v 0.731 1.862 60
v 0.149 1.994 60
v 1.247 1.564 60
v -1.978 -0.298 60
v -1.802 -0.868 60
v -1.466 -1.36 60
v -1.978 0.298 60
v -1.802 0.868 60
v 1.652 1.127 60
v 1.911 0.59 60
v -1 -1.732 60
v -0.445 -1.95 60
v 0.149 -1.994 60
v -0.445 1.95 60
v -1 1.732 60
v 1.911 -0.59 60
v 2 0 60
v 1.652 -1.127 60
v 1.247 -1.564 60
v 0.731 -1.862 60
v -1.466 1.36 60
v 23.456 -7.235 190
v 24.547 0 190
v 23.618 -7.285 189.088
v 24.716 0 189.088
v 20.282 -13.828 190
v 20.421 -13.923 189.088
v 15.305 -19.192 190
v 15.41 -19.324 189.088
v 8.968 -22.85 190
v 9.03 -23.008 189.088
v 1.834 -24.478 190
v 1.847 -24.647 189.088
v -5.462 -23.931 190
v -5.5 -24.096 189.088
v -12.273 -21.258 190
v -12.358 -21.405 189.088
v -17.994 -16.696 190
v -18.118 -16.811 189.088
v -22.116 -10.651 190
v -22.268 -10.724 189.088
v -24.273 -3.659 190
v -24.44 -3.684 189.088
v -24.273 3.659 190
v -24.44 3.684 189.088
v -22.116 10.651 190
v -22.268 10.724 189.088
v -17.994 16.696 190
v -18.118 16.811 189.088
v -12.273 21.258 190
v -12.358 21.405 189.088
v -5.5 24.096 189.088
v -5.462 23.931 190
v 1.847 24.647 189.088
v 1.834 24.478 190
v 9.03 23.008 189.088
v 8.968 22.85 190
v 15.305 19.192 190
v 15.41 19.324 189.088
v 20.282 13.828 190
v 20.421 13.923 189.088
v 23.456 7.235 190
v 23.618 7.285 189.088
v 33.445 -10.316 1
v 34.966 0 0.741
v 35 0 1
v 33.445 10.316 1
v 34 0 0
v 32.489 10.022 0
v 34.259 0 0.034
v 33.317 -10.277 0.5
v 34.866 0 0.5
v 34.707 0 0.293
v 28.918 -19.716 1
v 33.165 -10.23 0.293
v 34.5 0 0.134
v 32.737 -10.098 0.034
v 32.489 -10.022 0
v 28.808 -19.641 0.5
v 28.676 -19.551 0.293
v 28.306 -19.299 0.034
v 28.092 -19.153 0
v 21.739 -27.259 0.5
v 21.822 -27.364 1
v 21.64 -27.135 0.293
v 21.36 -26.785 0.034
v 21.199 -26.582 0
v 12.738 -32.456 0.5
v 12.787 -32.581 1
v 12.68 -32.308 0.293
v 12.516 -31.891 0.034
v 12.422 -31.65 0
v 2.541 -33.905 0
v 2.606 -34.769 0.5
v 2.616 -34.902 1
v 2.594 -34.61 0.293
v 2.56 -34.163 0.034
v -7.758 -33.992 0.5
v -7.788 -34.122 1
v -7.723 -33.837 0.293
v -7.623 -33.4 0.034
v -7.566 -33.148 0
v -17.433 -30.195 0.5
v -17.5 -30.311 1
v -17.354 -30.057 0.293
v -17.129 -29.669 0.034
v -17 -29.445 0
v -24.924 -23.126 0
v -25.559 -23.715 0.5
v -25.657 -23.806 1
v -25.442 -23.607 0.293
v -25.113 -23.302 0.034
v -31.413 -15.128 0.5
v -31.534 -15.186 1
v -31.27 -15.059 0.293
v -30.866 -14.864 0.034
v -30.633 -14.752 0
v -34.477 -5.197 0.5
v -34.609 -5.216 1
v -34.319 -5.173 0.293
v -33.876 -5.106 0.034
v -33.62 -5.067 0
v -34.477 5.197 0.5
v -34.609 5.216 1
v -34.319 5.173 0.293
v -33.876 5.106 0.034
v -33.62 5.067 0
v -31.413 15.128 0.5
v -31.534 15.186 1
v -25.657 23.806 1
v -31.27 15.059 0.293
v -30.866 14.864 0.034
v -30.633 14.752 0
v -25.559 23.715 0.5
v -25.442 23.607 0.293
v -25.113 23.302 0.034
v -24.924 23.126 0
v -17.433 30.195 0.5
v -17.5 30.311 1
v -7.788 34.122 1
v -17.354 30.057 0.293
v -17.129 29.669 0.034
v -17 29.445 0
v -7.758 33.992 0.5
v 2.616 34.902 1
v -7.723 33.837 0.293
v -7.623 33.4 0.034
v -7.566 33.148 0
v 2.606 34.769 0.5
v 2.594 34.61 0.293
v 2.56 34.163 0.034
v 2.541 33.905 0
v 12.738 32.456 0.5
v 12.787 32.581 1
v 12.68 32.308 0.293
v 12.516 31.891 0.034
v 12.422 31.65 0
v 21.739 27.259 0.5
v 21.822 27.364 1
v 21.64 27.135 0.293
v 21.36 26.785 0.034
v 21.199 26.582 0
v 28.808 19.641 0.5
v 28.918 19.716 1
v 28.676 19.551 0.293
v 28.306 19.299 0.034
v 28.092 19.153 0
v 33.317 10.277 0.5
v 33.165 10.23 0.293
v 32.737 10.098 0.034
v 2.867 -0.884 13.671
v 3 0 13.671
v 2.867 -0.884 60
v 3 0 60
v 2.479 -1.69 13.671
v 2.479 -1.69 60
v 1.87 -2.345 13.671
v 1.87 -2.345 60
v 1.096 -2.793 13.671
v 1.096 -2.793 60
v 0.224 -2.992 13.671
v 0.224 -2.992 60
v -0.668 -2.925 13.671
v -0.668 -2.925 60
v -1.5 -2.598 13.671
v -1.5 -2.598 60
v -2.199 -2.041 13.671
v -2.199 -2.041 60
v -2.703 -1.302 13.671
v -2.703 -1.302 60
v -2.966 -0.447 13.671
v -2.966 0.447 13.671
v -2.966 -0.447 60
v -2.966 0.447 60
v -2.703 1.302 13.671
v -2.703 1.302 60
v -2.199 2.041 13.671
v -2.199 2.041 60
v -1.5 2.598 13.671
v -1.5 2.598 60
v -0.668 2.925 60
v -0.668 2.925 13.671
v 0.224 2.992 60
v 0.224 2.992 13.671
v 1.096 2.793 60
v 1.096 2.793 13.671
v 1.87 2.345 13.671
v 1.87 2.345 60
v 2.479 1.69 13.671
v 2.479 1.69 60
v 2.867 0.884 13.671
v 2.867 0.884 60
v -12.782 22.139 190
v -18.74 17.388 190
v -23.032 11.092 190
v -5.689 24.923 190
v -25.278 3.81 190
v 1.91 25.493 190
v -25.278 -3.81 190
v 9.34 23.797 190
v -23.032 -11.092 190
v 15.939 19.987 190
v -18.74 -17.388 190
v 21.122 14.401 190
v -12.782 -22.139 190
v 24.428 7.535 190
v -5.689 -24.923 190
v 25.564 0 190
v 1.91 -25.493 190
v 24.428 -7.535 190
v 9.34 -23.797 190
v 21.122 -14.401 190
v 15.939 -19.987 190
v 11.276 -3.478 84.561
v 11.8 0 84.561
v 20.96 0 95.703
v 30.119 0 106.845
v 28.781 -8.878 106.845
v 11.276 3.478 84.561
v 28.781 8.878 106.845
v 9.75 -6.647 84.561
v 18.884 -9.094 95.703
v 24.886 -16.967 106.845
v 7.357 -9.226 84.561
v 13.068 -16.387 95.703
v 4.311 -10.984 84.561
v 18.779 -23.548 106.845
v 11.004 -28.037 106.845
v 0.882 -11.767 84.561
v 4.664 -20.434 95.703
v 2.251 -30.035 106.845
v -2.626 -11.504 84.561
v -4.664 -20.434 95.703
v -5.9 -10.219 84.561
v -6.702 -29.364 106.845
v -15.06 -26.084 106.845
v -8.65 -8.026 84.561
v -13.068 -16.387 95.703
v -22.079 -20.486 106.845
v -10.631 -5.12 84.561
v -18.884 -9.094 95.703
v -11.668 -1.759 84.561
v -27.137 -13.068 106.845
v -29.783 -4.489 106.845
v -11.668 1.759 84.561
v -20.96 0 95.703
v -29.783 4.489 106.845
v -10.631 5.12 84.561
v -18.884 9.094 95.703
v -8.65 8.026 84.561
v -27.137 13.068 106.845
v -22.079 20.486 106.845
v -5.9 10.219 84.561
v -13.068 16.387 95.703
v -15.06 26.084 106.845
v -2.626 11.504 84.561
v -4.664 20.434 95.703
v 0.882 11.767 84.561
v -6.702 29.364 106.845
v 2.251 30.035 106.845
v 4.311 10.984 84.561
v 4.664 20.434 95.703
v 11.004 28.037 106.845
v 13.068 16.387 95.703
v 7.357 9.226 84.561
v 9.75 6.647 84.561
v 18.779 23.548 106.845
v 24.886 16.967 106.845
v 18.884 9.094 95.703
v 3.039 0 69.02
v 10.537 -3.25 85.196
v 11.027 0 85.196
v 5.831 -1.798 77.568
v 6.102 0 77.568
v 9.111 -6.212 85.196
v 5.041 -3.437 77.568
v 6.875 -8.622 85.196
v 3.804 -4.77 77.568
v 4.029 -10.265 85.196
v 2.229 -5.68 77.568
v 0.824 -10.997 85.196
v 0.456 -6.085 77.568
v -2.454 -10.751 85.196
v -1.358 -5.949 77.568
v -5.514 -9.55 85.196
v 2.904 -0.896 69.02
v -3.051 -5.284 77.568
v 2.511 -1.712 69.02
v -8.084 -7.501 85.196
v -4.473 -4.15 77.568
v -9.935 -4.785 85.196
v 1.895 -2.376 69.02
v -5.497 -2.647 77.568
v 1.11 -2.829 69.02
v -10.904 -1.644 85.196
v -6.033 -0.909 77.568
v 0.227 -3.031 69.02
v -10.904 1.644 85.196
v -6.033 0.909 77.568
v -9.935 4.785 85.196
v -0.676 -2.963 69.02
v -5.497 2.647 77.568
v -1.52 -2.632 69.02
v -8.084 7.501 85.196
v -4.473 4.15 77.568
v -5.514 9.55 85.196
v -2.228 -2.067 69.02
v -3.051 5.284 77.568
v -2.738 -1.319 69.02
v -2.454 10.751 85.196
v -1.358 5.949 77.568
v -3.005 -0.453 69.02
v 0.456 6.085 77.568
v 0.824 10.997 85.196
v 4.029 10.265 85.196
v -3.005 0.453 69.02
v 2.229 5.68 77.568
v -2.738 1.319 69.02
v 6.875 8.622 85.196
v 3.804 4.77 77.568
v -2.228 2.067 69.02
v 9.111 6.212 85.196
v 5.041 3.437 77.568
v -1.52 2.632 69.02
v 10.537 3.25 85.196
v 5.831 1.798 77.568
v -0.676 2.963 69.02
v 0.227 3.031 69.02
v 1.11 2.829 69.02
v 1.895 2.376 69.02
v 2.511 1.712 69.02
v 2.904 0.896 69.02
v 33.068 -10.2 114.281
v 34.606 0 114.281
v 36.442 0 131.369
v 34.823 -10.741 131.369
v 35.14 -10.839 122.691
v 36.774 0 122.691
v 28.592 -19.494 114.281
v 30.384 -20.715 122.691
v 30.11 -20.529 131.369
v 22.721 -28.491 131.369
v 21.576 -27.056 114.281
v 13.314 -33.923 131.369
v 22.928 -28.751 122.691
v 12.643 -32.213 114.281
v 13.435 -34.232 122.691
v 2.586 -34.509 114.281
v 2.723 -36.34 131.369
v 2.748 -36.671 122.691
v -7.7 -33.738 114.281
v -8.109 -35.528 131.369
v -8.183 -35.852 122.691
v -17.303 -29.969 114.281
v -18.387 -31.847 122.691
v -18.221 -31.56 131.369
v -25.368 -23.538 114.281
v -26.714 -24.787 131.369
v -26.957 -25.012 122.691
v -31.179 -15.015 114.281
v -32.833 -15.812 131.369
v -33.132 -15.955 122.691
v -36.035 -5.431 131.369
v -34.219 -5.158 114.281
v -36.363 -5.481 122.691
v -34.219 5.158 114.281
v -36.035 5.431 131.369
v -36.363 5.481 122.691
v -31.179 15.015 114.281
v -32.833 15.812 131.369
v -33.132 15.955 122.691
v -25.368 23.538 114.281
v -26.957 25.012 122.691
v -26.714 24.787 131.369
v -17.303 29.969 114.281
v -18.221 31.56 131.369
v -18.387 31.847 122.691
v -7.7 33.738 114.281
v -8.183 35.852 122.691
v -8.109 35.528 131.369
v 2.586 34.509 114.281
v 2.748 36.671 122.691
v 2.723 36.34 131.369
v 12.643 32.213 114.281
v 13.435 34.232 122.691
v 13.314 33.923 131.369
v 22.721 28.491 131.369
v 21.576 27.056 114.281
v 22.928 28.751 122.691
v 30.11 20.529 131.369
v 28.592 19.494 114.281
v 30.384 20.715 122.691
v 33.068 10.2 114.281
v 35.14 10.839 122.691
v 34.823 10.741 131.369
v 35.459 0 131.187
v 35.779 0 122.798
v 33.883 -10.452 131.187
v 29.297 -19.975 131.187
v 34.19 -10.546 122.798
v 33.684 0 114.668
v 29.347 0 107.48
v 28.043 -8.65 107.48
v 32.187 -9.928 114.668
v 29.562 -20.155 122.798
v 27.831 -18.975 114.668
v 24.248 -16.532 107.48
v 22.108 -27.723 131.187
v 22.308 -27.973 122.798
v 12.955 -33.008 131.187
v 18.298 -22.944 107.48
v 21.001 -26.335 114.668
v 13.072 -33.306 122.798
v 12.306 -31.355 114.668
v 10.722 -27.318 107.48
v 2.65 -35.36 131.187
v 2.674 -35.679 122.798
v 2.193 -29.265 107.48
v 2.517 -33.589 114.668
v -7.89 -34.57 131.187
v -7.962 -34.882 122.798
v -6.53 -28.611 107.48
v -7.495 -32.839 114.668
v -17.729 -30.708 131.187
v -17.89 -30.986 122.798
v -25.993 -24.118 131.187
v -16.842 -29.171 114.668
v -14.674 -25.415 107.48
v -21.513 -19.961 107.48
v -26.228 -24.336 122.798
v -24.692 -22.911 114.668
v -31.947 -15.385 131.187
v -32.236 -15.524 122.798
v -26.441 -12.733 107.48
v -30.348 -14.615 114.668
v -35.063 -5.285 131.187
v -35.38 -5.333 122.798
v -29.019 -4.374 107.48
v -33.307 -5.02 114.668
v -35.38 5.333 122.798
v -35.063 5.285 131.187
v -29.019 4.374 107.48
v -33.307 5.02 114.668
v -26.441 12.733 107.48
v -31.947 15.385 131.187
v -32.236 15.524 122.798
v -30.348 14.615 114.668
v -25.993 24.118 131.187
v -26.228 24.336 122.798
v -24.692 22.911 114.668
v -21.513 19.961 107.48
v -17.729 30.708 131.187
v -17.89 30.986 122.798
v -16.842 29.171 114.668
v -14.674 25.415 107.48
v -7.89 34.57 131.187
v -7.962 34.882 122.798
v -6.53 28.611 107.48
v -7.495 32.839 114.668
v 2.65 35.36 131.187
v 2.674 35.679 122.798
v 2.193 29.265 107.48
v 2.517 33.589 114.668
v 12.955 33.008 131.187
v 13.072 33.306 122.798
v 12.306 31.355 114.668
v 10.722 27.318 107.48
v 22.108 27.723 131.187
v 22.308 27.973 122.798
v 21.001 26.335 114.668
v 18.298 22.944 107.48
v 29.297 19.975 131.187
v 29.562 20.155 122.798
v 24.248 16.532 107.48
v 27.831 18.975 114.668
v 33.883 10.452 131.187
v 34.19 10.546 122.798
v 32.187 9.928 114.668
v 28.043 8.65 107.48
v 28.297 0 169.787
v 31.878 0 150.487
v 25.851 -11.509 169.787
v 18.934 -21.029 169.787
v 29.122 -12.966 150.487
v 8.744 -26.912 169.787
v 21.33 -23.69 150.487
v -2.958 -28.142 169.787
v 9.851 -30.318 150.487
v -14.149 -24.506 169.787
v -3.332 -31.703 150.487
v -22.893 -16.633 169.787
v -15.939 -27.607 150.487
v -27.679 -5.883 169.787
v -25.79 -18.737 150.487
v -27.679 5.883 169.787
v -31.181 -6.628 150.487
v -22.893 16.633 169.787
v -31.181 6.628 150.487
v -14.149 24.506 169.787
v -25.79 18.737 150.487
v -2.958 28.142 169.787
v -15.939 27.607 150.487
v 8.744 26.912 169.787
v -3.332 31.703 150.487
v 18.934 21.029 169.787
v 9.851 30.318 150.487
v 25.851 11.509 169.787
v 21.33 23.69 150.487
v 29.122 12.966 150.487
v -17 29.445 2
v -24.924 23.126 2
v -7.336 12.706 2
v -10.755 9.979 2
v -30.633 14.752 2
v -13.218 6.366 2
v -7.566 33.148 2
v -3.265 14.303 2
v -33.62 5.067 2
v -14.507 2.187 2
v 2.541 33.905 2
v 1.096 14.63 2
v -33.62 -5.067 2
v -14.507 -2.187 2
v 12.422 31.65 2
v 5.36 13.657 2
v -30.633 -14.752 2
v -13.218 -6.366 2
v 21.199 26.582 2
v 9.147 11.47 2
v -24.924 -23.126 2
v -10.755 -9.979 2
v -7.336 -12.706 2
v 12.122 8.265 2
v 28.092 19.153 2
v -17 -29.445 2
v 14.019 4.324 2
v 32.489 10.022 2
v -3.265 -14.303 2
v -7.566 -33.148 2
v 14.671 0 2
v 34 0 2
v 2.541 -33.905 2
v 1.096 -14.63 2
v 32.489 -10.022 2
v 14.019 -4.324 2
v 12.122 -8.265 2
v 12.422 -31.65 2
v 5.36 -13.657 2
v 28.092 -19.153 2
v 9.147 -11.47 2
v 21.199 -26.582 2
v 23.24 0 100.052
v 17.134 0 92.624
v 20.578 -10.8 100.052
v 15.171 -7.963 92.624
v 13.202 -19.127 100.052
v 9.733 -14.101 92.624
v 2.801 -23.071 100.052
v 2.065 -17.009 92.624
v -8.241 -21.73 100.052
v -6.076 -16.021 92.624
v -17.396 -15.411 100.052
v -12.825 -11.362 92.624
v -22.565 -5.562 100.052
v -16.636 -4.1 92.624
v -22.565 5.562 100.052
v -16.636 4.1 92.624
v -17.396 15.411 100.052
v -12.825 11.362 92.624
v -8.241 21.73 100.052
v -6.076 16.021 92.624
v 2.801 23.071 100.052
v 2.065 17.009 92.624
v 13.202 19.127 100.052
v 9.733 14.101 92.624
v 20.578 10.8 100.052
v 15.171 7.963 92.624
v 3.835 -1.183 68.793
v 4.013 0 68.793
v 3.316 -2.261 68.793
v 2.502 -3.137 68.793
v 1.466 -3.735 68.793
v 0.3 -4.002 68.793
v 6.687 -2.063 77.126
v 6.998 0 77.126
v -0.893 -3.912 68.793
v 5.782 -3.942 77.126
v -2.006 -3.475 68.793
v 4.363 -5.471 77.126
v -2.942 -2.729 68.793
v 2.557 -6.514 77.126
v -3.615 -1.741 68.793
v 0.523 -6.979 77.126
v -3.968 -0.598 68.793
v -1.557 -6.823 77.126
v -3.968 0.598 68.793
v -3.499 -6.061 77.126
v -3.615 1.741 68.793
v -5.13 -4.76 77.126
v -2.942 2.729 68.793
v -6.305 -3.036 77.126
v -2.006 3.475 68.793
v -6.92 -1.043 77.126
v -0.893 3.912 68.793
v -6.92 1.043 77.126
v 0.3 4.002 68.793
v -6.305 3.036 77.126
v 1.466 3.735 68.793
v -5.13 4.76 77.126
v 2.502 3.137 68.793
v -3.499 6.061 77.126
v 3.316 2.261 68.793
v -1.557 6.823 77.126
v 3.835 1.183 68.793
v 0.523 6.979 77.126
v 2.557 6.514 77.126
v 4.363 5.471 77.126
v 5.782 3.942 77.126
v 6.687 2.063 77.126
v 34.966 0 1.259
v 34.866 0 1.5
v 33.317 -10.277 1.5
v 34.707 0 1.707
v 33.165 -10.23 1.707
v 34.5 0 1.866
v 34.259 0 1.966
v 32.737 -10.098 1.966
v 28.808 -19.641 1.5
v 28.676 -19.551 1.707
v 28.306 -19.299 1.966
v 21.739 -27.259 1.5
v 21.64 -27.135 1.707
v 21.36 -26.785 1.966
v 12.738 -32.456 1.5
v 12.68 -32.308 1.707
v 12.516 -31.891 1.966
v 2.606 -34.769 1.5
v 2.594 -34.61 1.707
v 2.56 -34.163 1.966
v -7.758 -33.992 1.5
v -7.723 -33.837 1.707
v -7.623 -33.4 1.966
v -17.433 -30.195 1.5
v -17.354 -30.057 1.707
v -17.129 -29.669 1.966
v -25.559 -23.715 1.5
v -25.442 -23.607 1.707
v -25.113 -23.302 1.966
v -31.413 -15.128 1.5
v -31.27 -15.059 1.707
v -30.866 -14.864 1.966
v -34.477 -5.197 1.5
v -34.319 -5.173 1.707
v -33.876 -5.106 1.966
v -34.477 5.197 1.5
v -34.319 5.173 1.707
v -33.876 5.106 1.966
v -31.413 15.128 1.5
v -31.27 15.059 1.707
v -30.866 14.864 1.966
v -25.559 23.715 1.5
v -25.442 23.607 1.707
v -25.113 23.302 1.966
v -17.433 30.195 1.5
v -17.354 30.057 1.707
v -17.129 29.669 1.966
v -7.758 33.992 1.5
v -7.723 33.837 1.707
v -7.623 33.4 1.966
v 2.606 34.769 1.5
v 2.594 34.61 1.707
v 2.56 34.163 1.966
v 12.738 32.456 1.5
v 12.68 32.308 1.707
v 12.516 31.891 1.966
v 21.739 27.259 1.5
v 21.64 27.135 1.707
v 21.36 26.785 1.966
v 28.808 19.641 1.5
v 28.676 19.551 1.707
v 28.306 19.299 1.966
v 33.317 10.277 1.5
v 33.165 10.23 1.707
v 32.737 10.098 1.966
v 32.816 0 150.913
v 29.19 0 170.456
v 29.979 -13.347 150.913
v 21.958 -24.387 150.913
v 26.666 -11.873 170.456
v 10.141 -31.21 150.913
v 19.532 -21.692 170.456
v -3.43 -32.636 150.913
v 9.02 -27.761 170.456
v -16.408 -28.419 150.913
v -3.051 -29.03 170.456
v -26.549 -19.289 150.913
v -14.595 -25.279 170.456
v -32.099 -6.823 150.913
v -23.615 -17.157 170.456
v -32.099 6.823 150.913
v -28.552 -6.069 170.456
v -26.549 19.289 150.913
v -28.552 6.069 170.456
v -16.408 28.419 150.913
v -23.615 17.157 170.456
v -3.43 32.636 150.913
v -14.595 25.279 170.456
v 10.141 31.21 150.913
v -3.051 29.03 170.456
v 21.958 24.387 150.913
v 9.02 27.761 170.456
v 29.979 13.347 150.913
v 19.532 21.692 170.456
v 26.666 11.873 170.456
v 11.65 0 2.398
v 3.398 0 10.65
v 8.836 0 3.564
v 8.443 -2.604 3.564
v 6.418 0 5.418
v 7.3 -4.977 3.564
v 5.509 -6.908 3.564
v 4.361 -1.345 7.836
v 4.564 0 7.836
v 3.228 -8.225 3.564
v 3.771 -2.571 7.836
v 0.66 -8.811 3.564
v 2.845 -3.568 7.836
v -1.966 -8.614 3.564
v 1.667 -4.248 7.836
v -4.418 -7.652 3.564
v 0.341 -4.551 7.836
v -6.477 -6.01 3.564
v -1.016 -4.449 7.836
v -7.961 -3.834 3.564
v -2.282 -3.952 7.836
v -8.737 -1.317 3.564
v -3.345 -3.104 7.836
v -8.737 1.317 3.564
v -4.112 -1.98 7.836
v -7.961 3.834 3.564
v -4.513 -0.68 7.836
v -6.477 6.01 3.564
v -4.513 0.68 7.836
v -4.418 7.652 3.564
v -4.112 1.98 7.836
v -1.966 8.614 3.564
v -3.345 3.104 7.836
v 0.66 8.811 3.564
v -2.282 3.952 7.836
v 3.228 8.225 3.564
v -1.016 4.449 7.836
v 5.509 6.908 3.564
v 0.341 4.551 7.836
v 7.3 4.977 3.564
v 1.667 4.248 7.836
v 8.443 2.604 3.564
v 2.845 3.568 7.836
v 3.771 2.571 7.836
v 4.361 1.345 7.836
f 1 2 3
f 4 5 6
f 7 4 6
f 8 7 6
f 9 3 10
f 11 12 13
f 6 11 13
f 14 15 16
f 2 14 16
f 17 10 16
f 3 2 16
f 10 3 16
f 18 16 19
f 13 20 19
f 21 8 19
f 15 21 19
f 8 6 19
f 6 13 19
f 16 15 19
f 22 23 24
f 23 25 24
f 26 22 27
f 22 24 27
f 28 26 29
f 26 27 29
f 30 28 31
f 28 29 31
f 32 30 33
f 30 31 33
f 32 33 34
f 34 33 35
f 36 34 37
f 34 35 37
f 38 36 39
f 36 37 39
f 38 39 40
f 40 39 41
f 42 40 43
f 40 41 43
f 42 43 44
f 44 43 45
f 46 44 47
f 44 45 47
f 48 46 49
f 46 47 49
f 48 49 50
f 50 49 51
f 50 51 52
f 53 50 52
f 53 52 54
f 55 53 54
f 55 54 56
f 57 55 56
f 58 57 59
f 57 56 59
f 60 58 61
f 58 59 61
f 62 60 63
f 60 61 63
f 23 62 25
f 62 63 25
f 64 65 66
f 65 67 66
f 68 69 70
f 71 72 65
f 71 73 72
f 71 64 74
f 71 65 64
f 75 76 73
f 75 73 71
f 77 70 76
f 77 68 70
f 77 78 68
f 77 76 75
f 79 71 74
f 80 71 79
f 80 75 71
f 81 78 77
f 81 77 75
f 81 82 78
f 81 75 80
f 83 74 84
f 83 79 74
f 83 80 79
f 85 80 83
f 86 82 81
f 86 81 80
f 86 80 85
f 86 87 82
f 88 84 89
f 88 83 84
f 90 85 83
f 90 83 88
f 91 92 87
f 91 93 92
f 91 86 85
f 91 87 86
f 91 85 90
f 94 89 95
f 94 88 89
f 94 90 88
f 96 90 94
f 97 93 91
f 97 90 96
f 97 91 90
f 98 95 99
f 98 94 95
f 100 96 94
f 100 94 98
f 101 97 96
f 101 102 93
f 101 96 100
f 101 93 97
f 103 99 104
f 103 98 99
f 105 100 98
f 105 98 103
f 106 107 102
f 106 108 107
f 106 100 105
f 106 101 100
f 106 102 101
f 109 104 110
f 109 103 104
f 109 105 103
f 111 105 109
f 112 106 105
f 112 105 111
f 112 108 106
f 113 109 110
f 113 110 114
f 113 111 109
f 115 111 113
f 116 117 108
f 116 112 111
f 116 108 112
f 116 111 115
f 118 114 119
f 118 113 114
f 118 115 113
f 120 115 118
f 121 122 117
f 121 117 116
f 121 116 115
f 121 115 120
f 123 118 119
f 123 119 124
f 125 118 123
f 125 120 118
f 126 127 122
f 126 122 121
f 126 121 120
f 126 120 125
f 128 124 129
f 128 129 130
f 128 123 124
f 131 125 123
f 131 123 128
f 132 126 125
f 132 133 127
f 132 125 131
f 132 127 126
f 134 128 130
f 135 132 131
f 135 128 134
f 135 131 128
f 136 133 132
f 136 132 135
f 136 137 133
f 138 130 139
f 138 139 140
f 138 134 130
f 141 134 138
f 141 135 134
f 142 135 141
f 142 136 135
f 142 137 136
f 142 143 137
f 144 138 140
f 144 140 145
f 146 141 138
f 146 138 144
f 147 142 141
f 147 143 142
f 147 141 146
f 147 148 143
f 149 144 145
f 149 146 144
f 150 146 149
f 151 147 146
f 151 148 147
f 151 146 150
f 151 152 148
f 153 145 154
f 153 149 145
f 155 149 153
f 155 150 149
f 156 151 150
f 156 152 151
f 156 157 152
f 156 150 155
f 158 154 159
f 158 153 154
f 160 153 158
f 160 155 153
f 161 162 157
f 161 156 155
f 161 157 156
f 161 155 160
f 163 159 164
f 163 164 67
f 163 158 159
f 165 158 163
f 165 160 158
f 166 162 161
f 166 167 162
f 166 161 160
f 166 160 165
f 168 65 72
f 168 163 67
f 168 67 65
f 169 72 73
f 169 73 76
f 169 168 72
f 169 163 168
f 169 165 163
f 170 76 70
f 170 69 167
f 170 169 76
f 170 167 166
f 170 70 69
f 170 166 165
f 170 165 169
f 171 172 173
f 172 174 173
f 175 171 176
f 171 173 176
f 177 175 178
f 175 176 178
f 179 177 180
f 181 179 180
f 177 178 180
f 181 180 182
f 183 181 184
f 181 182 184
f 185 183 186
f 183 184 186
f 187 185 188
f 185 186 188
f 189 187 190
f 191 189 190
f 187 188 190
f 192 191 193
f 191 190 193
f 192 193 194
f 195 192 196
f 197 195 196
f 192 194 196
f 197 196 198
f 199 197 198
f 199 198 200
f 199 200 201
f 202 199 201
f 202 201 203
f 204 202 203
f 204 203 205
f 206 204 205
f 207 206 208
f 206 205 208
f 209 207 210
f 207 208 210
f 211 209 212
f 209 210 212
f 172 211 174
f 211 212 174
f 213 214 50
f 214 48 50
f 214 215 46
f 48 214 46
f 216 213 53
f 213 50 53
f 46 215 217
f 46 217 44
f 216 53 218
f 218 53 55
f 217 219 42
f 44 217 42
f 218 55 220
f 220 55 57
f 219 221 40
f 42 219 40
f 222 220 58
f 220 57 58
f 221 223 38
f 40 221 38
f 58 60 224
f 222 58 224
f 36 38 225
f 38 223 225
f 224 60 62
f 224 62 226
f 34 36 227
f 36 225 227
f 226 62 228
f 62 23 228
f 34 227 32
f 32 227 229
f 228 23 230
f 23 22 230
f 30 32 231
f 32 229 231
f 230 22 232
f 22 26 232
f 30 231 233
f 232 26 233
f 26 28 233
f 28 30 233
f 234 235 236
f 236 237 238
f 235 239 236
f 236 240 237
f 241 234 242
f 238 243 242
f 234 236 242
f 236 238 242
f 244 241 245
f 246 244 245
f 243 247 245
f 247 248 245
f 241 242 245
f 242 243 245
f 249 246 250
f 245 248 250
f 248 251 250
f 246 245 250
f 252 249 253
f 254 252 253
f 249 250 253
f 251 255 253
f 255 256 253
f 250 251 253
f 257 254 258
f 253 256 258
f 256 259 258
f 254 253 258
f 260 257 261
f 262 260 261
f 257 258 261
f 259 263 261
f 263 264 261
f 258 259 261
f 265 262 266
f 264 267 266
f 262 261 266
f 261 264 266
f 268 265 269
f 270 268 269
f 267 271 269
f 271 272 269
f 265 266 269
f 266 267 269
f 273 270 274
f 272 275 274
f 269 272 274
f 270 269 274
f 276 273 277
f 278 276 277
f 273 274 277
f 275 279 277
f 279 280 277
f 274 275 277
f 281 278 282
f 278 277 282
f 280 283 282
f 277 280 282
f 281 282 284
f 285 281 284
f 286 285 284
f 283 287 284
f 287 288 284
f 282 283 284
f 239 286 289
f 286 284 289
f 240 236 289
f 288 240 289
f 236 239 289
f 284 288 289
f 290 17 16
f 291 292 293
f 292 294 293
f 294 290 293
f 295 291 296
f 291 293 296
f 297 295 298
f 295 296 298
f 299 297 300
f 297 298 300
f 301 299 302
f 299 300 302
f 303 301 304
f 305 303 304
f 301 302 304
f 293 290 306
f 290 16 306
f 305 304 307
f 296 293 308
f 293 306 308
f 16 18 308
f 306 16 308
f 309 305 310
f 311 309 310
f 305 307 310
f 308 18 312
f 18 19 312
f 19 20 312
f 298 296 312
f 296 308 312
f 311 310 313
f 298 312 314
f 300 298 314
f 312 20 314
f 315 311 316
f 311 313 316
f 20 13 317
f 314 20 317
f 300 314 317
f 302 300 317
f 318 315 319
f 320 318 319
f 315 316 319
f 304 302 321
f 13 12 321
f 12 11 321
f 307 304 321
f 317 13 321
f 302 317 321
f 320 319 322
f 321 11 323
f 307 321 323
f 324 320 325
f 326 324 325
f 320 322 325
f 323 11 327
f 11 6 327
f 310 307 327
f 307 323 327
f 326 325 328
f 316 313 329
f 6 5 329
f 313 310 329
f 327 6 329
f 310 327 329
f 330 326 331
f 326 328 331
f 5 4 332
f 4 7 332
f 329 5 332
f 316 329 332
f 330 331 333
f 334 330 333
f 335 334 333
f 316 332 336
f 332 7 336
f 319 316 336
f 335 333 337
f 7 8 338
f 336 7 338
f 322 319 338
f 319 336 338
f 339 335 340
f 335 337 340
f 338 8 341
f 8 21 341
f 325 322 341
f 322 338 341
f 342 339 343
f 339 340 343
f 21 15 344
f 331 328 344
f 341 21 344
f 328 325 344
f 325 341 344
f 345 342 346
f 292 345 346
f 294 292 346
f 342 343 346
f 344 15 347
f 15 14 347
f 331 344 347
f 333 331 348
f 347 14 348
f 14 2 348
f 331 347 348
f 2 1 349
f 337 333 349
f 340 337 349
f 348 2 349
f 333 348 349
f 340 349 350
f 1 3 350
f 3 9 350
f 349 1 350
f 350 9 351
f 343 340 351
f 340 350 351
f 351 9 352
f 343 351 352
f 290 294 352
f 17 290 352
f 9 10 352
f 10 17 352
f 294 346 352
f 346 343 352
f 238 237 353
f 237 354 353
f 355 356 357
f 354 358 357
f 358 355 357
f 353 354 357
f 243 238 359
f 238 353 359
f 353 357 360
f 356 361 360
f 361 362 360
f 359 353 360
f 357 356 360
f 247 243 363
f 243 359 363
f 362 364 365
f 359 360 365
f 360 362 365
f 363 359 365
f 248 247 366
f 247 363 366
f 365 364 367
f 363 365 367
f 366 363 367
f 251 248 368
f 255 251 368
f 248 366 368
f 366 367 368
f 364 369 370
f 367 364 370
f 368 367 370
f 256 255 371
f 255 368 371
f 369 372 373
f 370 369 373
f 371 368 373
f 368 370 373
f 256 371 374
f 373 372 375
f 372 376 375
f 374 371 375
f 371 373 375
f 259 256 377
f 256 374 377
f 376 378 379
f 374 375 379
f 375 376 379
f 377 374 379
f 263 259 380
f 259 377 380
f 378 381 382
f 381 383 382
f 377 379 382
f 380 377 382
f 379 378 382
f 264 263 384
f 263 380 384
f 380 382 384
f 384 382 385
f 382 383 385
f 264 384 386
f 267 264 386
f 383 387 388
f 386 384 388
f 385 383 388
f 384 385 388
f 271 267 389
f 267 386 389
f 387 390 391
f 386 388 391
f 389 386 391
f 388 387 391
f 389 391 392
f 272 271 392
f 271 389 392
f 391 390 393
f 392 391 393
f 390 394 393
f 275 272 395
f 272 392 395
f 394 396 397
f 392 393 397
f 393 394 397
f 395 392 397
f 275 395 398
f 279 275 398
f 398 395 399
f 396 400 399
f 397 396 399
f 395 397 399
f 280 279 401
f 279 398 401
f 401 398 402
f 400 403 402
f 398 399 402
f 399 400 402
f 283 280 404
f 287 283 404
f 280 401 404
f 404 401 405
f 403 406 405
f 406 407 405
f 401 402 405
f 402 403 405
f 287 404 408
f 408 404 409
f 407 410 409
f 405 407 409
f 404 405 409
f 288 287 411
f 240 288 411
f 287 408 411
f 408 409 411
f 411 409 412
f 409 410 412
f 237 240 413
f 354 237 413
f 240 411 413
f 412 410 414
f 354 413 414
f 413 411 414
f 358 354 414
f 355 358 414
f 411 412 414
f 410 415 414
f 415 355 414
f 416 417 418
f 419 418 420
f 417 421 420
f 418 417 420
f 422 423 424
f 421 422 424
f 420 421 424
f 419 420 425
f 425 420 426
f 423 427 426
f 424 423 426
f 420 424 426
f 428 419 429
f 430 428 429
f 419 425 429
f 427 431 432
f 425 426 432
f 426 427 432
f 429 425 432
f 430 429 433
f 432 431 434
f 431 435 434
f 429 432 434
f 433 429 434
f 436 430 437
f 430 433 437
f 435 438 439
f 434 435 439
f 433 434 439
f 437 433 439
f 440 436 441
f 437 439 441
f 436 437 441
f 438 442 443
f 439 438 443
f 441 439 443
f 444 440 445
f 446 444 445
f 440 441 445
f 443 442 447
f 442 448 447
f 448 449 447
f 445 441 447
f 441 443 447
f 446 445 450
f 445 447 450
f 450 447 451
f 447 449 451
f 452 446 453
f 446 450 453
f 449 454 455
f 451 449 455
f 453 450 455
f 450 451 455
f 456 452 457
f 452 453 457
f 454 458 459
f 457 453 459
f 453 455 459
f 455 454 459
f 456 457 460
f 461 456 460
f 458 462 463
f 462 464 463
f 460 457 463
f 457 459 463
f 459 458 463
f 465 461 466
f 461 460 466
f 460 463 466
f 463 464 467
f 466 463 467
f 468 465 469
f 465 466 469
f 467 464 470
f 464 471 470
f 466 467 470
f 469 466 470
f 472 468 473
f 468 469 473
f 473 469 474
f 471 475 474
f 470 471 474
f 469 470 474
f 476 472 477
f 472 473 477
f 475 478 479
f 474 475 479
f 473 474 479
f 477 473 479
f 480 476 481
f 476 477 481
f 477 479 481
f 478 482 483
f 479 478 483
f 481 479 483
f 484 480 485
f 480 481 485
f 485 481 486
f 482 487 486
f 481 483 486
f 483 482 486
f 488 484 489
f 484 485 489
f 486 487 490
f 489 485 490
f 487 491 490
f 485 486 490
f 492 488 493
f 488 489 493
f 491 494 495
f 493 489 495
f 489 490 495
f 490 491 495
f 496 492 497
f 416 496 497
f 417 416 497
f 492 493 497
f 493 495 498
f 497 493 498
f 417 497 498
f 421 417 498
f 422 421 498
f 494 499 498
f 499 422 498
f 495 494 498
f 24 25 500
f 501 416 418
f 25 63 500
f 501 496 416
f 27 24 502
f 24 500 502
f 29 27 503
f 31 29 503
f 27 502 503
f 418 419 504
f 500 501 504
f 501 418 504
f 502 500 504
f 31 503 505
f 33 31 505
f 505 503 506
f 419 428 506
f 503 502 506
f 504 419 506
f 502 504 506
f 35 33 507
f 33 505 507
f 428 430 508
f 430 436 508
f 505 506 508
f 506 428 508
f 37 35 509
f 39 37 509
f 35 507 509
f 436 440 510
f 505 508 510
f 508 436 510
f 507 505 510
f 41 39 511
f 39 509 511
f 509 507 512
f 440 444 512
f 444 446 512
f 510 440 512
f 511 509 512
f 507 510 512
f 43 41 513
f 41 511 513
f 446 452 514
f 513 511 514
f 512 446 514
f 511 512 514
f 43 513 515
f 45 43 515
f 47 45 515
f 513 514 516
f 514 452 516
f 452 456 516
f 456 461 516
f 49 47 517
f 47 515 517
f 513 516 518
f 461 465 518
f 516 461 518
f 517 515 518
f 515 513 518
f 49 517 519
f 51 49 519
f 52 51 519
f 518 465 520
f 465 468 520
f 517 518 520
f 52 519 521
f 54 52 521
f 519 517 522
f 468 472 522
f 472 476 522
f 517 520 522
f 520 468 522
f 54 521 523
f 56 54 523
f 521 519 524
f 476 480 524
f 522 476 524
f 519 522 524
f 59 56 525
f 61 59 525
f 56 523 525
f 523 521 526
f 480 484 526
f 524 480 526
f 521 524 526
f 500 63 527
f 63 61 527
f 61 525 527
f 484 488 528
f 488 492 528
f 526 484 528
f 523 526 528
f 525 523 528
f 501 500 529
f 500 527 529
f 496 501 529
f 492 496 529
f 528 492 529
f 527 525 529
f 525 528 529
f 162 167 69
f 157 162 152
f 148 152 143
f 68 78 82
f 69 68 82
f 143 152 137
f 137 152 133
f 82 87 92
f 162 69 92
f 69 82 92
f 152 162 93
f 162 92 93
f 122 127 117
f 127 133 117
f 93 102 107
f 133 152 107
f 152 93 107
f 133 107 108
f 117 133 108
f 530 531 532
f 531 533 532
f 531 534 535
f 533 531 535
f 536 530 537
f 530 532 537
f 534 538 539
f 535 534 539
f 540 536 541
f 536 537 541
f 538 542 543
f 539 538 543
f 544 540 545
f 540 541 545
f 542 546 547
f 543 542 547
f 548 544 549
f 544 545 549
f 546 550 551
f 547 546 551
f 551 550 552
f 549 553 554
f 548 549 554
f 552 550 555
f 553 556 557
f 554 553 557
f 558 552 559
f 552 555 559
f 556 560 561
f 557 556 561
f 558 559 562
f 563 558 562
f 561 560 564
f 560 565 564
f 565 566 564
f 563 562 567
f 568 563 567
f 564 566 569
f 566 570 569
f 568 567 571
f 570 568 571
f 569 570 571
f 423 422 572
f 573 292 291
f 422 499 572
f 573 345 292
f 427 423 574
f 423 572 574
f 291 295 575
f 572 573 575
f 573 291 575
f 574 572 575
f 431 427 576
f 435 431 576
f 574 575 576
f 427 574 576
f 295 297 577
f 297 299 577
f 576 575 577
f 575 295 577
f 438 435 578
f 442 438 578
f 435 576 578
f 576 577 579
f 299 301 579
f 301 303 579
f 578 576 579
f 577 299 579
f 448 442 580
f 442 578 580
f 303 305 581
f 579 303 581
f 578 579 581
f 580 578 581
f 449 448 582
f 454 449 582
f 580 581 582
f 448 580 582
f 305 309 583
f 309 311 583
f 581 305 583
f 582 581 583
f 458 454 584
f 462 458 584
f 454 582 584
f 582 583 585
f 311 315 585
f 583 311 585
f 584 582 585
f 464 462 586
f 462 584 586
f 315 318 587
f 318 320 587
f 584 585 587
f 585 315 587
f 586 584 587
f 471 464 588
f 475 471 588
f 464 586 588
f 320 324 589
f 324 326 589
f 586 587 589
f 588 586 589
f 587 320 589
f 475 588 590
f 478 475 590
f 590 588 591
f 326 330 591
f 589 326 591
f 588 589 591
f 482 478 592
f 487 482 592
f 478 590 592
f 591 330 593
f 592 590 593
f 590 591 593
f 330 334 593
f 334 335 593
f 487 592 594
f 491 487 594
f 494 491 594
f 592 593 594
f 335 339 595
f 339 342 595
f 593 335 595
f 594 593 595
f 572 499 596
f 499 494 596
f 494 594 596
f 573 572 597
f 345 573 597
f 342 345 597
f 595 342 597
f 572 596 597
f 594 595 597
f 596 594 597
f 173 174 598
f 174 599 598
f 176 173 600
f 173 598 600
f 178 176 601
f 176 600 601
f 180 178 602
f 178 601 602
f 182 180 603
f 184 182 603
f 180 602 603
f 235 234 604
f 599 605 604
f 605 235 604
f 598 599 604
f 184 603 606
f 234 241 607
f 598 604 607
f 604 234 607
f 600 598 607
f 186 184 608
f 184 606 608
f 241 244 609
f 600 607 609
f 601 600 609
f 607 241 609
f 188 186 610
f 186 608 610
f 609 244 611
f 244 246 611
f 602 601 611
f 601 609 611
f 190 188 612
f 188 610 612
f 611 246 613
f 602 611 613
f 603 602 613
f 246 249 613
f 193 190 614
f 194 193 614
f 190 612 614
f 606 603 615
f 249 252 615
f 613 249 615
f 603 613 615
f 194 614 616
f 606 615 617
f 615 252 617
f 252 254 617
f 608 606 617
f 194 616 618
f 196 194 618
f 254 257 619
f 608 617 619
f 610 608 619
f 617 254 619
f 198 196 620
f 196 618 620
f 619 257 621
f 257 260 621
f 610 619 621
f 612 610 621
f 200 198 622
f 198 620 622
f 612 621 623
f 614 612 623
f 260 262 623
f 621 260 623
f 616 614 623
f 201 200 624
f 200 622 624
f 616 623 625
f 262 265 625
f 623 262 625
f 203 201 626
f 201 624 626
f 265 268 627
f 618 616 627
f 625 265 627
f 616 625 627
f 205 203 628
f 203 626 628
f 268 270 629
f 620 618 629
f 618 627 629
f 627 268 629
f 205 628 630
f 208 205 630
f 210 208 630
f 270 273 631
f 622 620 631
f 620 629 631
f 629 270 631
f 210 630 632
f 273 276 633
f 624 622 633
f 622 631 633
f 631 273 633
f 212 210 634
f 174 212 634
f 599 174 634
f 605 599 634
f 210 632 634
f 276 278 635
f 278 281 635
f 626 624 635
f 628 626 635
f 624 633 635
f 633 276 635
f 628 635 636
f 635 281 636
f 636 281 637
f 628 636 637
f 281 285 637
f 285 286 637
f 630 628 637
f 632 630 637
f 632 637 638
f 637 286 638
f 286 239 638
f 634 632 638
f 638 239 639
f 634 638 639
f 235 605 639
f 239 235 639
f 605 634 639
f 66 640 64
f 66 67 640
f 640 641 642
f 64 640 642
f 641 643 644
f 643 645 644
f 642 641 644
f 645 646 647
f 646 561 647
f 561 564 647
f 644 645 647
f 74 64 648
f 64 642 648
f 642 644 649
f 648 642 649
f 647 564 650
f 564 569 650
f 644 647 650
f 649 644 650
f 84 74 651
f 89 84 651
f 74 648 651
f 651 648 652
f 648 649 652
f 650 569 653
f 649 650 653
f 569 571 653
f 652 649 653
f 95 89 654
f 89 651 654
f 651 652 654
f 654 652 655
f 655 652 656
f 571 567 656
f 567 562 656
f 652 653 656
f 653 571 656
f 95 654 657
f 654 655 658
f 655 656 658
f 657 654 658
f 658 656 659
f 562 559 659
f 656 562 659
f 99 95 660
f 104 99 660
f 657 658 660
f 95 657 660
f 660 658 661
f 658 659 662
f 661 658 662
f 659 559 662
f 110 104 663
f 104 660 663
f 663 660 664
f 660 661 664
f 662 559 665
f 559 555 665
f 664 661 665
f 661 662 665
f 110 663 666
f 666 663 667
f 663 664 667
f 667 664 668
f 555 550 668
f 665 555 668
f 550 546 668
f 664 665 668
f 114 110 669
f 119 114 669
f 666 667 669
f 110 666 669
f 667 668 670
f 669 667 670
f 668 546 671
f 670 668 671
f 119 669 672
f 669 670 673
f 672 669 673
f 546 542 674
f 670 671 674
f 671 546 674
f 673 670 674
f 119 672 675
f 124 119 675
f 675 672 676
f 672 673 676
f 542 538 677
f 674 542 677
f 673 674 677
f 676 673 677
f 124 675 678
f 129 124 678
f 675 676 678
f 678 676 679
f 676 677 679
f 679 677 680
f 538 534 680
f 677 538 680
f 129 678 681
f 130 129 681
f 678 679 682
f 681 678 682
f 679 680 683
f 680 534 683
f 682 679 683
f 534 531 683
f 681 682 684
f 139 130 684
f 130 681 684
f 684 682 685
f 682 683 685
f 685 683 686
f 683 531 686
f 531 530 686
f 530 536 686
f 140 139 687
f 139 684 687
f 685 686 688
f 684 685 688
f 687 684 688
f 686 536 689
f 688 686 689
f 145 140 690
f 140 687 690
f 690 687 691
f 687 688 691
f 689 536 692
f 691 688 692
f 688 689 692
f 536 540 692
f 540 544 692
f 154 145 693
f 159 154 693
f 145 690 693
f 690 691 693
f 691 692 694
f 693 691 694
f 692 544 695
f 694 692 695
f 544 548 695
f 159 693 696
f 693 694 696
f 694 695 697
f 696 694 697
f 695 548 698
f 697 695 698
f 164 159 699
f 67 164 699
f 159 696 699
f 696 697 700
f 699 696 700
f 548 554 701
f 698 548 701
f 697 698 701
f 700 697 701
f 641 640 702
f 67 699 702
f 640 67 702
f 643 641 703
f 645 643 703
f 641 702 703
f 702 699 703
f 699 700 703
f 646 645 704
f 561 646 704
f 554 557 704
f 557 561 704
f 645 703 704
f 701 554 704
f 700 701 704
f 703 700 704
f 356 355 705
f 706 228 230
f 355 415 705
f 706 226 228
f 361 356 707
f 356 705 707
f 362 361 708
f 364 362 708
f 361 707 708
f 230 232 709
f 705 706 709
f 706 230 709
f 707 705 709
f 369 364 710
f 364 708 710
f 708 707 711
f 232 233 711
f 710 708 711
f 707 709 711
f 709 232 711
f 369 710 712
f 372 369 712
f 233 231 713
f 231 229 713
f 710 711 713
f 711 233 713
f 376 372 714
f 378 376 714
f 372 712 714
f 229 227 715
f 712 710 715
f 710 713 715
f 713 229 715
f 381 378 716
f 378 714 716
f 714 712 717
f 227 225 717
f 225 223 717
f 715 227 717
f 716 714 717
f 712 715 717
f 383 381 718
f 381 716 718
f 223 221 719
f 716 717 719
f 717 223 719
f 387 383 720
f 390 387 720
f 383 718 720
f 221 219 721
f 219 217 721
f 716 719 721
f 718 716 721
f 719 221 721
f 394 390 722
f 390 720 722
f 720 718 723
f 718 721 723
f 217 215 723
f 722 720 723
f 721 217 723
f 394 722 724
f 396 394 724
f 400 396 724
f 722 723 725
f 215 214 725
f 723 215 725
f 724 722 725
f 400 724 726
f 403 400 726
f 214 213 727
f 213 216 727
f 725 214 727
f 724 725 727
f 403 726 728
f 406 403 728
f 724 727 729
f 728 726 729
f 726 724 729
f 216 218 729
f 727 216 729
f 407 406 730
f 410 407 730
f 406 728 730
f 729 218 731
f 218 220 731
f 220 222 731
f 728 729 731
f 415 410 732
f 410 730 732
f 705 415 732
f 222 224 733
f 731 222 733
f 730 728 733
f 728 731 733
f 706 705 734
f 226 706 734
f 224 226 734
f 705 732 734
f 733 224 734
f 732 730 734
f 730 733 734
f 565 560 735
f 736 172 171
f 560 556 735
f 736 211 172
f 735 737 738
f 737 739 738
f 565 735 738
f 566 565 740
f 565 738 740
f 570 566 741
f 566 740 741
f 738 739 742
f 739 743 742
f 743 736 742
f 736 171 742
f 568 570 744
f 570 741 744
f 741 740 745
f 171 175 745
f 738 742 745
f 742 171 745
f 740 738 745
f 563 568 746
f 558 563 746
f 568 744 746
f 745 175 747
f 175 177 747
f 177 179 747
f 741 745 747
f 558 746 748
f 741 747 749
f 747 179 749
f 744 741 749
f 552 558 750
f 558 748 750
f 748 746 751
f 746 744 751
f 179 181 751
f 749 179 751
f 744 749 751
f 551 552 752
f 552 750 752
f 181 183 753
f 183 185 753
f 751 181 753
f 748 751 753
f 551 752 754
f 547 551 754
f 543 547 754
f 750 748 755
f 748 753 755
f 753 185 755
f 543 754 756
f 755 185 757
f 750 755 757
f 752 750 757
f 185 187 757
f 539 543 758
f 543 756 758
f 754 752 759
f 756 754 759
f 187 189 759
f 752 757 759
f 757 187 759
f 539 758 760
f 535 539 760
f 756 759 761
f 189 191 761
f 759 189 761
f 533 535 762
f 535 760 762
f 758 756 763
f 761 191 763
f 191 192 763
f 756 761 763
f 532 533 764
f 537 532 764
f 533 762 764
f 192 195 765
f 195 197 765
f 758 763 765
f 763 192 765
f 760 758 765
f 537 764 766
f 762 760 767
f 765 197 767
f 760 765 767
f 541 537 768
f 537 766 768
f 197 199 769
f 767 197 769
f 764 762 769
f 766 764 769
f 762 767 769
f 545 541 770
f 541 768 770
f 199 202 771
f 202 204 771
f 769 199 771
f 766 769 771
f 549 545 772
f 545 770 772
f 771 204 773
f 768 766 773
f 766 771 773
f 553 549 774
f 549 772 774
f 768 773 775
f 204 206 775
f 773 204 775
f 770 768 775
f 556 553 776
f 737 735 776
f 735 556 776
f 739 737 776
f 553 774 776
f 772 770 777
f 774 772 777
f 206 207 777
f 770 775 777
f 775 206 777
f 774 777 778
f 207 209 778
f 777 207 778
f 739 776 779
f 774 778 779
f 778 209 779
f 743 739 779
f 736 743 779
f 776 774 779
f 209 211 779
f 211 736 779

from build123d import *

# Parameters (mm, degrees)
F2_R = 1
F3_R = 0.99999


# Not quite as in the source:
# - a fillet or chamfer is up to 0.001 mm smaller than in the source, because OpenCascade refuses the exact size


with BuildPart() as f1:
    # F0 (on Front) → F1 (revolve)
    with BuildSketch(Plane.XZ):
        with BuildLine():
            Line((0, 0), (35, 0))
            Line((35, 0), (35, 2))
            Line((35, 2), (14.6711988598, 2))
            ThreePointArc((14.6711988598, 2), (6.4184150015, 5.4184150015), (3, 13.6711988598))
            Line((3, 13.6711988598), (3, 60))
            ThreePointArc((3, 60), (5.2663701885, 73.0449457567), (11.7998654023, 84.5610424876))
            Line((11.7998654023, 84.5610424876), (30.1194867973, 106.8448902178))
            ThreePointArc((30.1194867973, 106.8448902178), (35.9954931852, 118.4070626292), (36.4419899072, 131.3690039428))
            Line((36.4419899072, 131.3690039428), (25.5640022925, 190))
            Line((25.5640022925, 190), (24.5469366539, 190))
            Line((24.5469366539, 190), (24.716161279, 189.0879003841))
            Line((24.716161279, 189.0879003841), (35.4587691965, 131.186584004))
            ThreePointArc((35.4587691965, 131.186584004), (35.0271556985, 118.6567074008), (29.3470161902, 107.4799407364))
            Line((29.3470161902, 107.4799407364), (11.0273947953, 85.1960930063))
            ThreePointArc((11.0273947953, 85.1960930063), (4.3249694749, 73.3822359826), (2, 60))
            Line((2, 60), (0, 60))
            Line((0, 60), (0, 0))
        make_face()
    revolve(axis=Axis((0, 0, -18.4489581734), (0, 0, -1)))

    # F2
    f2_edges = [f1.edges().sort_by_distance(p)[0] for p in [
        (-35, 0, 2),
    ]]
    fillet(f2_edges, radius=F2_R)

    # F3 (radius 1 in the source; OpenCascade refuses exactly that, so slightly less here)
    f3_edges = [f1.edges().sort_by_distance(p)[0] for p in [
        (-35, 0, 0),
    ]]
    fillet(f3_edges, radius=F3_R)


solid = f1.part
